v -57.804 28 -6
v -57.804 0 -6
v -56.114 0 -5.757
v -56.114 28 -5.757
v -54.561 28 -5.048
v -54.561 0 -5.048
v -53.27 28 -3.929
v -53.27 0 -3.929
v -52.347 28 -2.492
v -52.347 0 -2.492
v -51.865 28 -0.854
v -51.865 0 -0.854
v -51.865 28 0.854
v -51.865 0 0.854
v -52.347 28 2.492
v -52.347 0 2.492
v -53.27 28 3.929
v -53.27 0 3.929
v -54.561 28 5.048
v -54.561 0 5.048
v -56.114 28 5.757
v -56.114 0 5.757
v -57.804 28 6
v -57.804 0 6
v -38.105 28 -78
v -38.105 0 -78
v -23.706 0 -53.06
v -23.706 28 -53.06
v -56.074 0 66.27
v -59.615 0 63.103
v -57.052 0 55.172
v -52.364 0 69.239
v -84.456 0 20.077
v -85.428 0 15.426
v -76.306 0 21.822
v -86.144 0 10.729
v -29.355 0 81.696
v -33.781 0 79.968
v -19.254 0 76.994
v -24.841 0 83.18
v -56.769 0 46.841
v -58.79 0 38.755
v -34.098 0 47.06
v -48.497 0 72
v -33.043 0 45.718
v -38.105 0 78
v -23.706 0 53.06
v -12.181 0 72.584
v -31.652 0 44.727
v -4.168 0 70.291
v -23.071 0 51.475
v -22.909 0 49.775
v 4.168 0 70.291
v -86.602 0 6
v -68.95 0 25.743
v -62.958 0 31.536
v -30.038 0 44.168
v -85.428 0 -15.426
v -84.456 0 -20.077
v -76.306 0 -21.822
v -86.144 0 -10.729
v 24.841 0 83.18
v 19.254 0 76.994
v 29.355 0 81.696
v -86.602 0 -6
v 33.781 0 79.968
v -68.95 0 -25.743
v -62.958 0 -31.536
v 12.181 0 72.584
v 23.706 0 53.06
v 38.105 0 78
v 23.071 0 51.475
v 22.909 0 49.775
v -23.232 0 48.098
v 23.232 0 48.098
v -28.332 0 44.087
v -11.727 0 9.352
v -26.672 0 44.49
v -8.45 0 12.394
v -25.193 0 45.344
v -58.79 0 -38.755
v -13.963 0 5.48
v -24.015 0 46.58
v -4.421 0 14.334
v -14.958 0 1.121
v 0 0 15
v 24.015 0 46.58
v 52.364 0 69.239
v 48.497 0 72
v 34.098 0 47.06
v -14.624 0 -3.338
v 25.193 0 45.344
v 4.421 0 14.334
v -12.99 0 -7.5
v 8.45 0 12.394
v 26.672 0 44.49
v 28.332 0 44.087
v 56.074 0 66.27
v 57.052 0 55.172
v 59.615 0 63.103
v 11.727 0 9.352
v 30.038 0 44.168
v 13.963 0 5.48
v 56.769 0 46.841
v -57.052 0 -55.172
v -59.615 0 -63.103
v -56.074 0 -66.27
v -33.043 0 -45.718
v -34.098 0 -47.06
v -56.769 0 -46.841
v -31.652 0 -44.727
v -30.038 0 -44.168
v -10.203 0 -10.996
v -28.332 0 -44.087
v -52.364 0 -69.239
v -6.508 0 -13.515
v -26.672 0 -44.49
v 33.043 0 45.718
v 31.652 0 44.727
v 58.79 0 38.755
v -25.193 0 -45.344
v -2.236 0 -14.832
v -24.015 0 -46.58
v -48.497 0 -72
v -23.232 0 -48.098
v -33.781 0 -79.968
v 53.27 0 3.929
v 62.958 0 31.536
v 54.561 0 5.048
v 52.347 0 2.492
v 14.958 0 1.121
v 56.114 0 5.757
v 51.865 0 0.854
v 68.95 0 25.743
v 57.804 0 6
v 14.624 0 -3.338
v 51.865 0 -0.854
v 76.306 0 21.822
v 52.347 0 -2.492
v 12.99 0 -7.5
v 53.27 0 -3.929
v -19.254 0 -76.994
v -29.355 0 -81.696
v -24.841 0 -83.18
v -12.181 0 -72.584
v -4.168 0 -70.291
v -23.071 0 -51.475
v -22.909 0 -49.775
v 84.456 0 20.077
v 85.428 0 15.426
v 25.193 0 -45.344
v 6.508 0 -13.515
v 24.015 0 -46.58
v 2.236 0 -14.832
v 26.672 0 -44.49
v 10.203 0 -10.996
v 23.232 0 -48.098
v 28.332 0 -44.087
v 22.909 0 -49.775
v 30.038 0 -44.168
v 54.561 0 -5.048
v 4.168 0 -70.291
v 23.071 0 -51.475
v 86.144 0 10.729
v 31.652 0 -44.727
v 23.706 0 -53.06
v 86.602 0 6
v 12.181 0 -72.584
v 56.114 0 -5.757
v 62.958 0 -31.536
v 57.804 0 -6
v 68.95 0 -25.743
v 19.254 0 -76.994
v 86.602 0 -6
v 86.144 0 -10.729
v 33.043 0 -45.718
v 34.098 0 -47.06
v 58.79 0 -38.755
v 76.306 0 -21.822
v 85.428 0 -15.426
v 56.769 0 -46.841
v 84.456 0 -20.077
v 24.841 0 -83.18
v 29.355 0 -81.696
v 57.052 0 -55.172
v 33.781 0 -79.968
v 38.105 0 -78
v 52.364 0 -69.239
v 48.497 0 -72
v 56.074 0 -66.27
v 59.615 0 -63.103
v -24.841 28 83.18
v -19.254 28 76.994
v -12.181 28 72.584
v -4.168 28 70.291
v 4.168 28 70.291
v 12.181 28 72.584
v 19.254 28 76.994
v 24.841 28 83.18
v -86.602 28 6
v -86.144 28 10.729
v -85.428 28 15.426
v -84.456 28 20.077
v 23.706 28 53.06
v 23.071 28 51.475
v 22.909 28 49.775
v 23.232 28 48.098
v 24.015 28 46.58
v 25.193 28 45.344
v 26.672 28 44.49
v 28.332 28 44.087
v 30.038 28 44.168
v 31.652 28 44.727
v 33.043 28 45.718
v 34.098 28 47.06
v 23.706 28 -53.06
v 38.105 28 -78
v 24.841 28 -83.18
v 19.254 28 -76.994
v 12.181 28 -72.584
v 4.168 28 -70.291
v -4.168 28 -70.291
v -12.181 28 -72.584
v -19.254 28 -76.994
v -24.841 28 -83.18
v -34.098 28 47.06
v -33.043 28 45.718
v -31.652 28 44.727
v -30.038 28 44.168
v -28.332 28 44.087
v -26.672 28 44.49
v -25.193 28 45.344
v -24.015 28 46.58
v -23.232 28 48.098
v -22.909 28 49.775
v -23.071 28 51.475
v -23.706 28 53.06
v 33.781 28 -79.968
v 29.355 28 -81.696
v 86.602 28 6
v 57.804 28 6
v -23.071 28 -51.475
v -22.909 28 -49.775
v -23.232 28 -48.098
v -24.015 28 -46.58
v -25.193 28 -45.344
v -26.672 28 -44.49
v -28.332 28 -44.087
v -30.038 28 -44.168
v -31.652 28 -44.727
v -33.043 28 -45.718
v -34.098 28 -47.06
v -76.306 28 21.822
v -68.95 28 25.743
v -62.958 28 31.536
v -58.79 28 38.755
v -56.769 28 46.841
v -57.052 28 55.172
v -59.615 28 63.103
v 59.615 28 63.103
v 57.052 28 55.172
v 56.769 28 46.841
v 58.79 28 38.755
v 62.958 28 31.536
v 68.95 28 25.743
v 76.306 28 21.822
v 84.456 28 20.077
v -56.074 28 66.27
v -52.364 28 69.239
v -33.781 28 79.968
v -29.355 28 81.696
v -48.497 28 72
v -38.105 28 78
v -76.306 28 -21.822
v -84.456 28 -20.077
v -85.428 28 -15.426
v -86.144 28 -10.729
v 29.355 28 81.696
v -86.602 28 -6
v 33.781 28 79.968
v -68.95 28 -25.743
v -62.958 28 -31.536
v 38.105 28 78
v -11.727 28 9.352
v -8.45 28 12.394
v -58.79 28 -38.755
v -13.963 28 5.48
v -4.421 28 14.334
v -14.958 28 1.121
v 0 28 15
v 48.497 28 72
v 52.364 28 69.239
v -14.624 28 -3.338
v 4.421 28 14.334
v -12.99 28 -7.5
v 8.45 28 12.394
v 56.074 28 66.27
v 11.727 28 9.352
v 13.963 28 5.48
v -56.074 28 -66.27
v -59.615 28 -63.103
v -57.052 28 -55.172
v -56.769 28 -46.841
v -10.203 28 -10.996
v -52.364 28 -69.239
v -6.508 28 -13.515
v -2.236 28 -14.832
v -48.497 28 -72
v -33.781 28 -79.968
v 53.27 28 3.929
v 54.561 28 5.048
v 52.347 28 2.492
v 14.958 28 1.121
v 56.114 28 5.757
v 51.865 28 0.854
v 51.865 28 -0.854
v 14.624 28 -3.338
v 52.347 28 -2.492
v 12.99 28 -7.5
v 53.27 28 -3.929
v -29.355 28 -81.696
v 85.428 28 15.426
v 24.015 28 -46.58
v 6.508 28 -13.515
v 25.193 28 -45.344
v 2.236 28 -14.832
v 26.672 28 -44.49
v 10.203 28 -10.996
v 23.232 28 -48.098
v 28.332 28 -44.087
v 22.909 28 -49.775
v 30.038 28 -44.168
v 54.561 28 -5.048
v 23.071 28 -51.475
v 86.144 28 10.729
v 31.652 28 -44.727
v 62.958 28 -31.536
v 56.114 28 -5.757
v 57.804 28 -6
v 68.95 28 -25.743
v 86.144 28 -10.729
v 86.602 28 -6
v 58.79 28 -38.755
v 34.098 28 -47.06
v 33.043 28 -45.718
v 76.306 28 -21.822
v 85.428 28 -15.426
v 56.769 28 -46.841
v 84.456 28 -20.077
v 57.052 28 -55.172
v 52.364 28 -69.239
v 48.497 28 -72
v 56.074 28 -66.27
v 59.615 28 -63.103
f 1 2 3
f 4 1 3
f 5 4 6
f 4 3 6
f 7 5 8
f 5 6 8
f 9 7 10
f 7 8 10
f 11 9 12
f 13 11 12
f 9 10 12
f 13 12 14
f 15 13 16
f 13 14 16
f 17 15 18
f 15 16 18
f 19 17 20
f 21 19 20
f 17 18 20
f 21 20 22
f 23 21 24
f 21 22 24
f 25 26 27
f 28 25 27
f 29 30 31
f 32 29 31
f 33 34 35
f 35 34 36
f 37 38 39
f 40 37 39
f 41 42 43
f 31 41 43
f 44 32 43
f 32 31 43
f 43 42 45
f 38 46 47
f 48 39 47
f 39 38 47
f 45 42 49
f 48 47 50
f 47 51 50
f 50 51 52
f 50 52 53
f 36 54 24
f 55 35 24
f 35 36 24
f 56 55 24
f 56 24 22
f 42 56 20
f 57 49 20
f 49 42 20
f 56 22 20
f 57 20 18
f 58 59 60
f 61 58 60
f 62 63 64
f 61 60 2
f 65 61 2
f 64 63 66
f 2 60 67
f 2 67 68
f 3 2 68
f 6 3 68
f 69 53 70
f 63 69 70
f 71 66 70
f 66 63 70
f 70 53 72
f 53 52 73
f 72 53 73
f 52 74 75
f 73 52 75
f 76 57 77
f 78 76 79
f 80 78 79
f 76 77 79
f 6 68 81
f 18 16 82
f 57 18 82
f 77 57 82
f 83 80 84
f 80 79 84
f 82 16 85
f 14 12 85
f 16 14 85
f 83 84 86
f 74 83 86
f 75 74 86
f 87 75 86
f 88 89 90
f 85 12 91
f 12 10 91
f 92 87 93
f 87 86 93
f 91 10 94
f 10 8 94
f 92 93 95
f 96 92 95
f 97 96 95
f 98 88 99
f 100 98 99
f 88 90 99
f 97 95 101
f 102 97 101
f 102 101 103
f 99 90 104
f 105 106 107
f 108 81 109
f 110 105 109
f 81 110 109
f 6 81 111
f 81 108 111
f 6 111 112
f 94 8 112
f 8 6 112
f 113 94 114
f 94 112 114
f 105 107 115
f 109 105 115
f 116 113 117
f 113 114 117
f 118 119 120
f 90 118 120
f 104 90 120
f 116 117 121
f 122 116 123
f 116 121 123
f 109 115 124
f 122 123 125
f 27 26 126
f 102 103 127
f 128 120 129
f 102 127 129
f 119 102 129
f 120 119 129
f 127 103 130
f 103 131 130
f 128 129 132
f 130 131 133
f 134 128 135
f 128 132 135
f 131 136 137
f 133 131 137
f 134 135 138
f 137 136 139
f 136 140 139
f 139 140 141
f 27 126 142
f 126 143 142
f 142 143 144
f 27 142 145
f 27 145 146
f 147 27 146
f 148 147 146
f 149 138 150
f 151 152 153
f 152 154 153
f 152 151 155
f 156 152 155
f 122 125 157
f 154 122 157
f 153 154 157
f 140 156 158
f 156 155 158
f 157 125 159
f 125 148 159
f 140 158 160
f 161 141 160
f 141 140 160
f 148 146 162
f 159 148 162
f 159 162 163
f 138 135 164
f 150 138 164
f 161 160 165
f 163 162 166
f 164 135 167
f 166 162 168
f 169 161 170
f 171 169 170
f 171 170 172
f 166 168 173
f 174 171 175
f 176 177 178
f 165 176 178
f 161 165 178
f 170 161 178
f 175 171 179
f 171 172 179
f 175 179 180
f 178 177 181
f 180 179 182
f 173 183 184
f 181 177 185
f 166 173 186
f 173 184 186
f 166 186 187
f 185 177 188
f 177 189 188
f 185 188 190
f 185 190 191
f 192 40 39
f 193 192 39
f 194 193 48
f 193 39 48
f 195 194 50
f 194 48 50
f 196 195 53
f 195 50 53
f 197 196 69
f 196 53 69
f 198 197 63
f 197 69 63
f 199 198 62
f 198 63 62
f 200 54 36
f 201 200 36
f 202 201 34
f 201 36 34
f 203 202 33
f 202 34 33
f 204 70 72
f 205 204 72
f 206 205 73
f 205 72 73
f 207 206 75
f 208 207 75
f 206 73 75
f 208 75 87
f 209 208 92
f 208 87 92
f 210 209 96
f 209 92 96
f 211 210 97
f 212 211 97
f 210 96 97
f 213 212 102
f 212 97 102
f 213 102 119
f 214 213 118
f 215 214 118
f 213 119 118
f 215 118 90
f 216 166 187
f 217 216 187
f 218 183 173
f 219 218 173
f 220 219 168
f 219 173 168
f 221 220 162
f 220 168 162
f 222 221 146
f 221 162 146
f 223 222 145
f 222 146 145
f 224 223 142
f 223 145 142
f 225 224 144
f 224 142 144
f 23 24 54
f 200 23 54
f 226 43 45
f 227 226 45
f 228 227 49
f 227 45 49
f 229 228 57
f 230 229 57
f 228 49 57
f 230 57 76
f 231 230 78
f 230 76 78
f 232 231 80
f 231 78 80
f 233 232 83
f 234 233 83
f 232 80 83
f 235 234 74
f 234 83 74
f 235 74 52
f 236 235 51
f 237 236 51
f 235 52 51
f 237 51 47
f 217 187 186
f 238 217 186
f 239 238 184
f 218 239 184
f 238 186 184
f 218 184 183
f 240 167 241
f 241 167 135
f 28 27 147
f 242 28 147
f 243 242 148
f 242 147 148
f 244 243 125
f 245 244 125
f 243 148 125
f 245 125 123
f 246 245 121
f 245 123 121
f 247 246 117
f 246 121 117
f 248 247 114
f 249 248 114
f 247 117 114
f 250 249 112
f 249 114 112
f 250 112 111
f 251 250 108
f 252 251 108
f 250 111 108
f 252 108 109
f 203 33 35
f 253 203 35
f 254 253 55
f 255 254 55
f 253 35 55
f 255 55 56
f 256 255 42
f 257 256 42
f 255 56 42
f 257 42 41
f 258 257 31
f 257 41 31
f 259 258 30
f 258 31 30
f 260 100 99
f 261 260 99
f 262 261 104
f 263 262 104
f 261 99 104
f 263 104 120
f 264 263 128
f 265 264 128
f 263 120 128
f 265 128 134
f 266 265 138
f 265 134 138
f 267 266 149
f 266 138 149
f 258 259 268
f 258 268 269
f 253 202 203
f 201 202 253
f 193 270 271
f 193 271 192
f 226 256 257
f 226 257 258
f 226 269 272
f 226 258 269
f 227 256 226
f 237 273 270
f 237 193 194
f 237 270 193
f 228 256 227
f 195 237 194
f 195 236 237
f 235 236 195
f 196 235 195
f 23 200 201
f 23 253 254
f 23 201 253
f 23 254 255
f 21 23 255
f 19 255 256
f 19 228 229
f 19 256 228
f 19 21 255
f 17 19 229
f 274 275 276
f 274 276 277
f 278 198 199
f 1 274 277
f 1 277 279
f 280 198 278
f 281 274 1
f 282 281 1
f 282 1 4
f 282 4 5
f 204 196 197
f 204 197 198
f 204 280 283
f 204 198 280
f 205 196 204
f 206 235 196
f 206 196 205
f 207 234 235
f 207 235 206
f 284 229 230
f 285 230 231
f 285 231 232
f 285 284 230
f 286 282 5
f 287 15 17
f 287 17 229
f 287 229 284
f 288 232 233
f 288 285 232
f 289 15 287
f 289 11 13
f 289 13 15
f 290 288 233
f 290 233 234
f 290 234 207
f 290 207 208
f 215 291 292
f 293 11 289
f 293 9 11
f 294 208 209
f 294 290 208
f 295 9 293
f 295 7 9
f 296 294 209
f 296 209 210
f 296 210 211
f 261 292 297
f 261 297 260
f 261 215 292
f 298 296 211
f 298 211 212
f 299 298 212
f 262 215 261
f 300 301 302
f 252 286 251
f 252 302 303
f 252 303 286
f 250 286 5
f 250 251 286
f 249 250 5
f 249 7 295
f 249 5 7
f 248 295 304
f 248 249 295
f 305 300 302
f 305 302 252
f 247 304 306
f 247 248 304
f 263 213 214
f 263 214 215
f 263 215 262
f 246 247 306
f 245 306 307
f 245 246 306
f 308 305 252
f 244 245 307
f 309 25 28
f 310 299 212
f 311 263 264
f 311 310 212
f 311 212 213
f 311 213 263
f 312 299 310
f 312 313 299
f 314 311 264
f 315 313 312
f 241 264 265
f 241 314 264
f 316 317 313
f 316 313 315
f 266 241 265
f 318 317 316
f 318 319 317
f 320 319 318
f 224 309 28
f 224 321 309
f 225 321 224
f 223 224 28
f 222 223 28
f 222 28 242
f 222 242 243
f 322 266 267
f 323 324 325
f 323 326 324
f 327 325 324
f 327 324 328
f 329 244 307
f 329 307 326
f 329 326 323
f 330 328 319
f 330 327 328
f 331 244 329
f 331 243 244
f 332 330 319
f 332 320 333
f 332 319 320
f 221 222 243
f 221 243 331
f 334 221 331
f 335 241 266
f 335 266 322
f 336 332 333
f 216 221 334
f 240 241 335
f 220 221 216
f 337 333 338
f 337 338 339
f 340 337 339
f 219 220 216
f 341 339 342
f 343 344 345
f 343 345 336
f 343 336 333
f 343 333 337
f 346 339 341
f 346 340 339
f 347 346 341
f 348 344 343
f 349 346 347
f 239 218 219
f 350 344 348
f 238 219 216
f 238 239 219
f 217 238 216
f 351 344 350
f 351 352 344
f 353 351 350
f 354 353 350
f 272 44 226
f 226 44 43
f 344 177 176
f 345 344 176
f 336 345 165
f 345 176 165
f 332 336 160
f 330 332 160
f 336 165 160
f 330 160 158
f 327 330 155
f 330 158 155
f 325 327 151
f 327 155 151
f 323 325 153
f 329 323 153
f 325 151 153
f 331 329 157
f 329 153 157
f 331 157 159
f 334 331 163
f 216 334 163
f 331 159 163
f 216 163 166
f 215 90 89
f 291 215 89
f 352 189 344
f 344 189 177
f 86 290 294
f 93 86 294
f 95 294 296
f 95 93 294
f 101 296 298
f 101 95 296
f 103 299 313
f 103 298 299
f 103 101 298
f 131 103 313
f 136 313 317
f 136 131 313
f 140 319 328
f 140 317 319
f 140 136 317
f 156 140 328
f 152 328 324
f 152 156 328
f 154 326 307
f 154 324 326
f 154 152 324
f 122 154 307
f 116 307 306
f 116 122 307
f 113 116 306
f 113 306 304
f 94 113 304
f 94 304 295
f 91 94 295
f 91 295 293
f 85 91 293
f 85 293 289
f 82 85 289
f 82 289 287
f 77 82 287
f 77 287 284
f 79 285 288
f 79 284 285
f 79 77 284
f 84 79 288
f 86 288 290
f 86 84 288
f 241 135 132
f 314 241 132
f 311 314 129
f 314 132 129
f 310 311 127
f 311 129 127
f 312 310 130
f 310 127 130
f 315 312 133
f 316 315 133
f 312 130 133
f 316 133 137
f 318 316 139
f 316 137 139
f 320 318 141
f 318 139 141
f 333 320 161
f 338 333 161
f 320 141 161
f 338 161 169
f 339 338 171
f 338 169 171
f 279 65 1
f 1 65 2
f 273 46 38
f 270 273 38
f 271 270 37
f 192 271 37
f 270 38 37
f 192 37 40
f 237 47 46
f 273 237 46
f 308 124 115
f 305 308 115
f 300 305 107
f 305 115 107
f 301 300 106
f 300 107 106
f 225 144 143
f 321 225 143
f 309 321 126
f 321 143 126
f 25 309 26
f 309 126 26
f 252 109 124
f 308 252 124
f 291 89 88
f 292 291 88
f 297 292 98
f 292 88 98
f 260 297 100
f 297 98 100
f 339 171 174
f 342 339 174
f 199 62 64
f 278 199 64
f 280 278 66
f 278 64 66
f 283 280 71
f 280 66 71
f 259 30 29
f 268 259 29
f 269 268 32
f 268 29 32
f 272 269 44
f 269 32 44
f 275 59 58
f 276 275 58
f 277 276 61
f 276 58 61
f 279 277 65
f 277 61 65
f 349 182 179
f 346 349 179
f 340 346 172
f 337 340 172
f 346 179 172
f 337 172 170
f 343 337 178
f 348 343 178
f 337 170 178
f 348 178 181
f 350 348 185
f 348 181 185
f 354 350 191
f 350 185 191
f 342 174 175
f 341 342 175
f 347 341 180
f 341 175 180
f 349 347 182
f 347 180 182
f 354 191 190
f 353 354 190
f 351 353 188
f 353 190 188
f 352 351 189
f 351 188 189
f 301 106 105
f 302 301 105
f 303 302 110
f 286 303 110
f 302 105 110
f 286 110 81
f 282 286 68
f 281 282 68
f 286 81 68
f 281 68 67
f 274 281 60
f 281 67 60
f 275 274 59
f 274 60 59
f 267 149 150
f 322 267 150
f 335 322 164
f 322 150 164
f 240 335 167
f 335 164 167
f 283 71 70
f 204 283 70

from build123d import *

# Parameters (mm, degrees)
BOSS_EXTRUDE1_DEPTH     = 28
CUT_EXTRUDE1_DEPTH      = 124.299913301
CUT_EXTRUDE1_DEPTH_BACK = 124.299913301
SKETCH2_R               = 15


with BuildPart() as part:
    # Sketch1 → Boss-Extrude1 (new body)
    with BuildSketch(Plane(origin=(0, 0, 0), x_dir=(1, 0, 0), z_dir=(0, 1, 0))):
        with BuildLine():
            Line((34.09833793, -47.060053749), (48.497353619, -71.9998805))
            ThreePointArc((48.497353619, -71.9998805), (54.23905714, -67.779796256), (59.615306076, -63.103021968))
            ThreePointArc((59.615306076, -63.103021968), (60.621778265, -35), (84.456473118, -20.076858532))
            ThreePointArc((84.456473118, -20.076858532), (85.818553991, -13.082503233), (86.602402392, -6))
            Line((86.602402392, -6), (57.804371015, -6))
            ThreePointArc((57.804371015, -6), (51.804371015, 0), (57.804371015, 6))
            Line((57.804371015, 6), (86.602402392, 6))
            ThreePointArc((86.602402392, 6), (85.818553991, 13.082503233), (84.456473118, 20.076858532))
            ThreePointArc((84.456473118, 20.076858532), (60.621778265, 35), (59.615306076, 63.103021968))
            ThreePointArc((59.615306076, 63.103021968), (54.23905714, 67.779796256), (48.497353619, 71.9998805))
            Line((48.497353619, 71.9998805), (34.09833793, 47.060053749))
            ThreePointArc((34.09833793, 47.060053749), (25.902185507, 44.863901326), (23.706033085, 53.060053749))
            Line((23.706033085, 53.060053749), (38.105048773, 77.9998805))
            ThreePointArc((38.105048773, 77.9998805), (31.579496851, 80.862299489), (24.841167042, 83.1798805))
            ThreePointArc((24.841167042, 83.1798805), (0, 70), (-24.841167042, 83.1798805))
            ThreePointArc((-24.841167042, 83.1798805), (-31.579496851, 80.862299489), (-38.105048773, 77.9998805))
            Line((-38.105048773, 77.9998805), (-23.706033085, 53.060053749))
            ThreePointArc((-23.706033085, 53.060053749), (-25.902185507, 44.863901326), (-34.09833793, 47.060053749))
            Line((-34.09833793, 47.060053749), (-48.497353619, 71.9998805))
            ThreePointArc((-48.497353619, 71.9998805), (-54.23905714, 67.779796256), (-59.615306076, 63.103021968))
            ThreePointArc((-59.615306076, 63.103021968), (-60.621778265, 35), (-84.456473118, 20.076858532))
            ThreePointArc((-84.456473118, 20.076858532), (-85.818553991, 13.082503233), (-86.602402392, 6))
            Line((-86.602402392, 6), (-57.804371015, 6))
            ThreePointArc((-57.804371015, 6), (-51.804371015, 0), (-57.804371015, -6))
            Line((-57.804371015, -6), (-86.602402392, -6))
            ThreePointArc((-86.602402392, -6), (-85.818553991, -13.082503233), (-84.456473118, -20.076858532))
            ThreePointArc((-84.456473118, -20.076858532), (-60.621778265, -35), (-59.615306076, -63.103021968))
            ThreePointArc((-59.615306076, -63.103021968), (-54.23905714, -67.779796256), (-48.497353619, -71.9998805))
            Line((-48.497353619, -71.9998805), (-34.09833793, -47.060053749))
            ThreePointArc((-34.09833793, -47.060053749), (-25.902185507, -44.863901326), (-23.706033085, -53.060053749))
            Line((-23.706033085, -53.060053749), (-38.105048773, -77.9998805))
            ThreePointArc((-38.105048773, -77.9998805), (-31.579496851, -80.862299489), (-24.841167042, -83.1798805))
            ThreePointArc((-24.841167042, -83.1798805), (0, -70), (24.841167042, -83.1798805))
            ThreePointArc((24.841167042, -83.1798805), (31.579496851, -80.862299489), (38.105048773, -77.9998805))
            Line((38.105048773, -77.9998805), (23.706033085, -53.060053749))
            ThreePointArc((23.706033085, -53.060053749), (25.902185507, -44.863901326), (34.09833793, -47.060053749))
        make_face()
    extrude(amount=BOSS_EXTRUDE1_DEPTH)

    # Sketch2 → Cut-Extrude1 (cut, two sides: drawn at the far end of the back side and taken through both)
    with BuildSketch(Plane(origin=(0, 28, 0), x_dir=(1, 0, 0), z_dir=(0, 1, 0)).offset(-CUT_EXTRUDE1_DEPTH_BACK)):
        with Locations(Location((0, 0, 0), (0, 0, 270))):
            Circle(SKETCH2_R)
    extrude(amount=CUT_EXTRUDE1_DEPTH + CUT_EXTRUDE1_DEPTH_BACK, mode=Mode.SUBTRACT)


solid = part.part
